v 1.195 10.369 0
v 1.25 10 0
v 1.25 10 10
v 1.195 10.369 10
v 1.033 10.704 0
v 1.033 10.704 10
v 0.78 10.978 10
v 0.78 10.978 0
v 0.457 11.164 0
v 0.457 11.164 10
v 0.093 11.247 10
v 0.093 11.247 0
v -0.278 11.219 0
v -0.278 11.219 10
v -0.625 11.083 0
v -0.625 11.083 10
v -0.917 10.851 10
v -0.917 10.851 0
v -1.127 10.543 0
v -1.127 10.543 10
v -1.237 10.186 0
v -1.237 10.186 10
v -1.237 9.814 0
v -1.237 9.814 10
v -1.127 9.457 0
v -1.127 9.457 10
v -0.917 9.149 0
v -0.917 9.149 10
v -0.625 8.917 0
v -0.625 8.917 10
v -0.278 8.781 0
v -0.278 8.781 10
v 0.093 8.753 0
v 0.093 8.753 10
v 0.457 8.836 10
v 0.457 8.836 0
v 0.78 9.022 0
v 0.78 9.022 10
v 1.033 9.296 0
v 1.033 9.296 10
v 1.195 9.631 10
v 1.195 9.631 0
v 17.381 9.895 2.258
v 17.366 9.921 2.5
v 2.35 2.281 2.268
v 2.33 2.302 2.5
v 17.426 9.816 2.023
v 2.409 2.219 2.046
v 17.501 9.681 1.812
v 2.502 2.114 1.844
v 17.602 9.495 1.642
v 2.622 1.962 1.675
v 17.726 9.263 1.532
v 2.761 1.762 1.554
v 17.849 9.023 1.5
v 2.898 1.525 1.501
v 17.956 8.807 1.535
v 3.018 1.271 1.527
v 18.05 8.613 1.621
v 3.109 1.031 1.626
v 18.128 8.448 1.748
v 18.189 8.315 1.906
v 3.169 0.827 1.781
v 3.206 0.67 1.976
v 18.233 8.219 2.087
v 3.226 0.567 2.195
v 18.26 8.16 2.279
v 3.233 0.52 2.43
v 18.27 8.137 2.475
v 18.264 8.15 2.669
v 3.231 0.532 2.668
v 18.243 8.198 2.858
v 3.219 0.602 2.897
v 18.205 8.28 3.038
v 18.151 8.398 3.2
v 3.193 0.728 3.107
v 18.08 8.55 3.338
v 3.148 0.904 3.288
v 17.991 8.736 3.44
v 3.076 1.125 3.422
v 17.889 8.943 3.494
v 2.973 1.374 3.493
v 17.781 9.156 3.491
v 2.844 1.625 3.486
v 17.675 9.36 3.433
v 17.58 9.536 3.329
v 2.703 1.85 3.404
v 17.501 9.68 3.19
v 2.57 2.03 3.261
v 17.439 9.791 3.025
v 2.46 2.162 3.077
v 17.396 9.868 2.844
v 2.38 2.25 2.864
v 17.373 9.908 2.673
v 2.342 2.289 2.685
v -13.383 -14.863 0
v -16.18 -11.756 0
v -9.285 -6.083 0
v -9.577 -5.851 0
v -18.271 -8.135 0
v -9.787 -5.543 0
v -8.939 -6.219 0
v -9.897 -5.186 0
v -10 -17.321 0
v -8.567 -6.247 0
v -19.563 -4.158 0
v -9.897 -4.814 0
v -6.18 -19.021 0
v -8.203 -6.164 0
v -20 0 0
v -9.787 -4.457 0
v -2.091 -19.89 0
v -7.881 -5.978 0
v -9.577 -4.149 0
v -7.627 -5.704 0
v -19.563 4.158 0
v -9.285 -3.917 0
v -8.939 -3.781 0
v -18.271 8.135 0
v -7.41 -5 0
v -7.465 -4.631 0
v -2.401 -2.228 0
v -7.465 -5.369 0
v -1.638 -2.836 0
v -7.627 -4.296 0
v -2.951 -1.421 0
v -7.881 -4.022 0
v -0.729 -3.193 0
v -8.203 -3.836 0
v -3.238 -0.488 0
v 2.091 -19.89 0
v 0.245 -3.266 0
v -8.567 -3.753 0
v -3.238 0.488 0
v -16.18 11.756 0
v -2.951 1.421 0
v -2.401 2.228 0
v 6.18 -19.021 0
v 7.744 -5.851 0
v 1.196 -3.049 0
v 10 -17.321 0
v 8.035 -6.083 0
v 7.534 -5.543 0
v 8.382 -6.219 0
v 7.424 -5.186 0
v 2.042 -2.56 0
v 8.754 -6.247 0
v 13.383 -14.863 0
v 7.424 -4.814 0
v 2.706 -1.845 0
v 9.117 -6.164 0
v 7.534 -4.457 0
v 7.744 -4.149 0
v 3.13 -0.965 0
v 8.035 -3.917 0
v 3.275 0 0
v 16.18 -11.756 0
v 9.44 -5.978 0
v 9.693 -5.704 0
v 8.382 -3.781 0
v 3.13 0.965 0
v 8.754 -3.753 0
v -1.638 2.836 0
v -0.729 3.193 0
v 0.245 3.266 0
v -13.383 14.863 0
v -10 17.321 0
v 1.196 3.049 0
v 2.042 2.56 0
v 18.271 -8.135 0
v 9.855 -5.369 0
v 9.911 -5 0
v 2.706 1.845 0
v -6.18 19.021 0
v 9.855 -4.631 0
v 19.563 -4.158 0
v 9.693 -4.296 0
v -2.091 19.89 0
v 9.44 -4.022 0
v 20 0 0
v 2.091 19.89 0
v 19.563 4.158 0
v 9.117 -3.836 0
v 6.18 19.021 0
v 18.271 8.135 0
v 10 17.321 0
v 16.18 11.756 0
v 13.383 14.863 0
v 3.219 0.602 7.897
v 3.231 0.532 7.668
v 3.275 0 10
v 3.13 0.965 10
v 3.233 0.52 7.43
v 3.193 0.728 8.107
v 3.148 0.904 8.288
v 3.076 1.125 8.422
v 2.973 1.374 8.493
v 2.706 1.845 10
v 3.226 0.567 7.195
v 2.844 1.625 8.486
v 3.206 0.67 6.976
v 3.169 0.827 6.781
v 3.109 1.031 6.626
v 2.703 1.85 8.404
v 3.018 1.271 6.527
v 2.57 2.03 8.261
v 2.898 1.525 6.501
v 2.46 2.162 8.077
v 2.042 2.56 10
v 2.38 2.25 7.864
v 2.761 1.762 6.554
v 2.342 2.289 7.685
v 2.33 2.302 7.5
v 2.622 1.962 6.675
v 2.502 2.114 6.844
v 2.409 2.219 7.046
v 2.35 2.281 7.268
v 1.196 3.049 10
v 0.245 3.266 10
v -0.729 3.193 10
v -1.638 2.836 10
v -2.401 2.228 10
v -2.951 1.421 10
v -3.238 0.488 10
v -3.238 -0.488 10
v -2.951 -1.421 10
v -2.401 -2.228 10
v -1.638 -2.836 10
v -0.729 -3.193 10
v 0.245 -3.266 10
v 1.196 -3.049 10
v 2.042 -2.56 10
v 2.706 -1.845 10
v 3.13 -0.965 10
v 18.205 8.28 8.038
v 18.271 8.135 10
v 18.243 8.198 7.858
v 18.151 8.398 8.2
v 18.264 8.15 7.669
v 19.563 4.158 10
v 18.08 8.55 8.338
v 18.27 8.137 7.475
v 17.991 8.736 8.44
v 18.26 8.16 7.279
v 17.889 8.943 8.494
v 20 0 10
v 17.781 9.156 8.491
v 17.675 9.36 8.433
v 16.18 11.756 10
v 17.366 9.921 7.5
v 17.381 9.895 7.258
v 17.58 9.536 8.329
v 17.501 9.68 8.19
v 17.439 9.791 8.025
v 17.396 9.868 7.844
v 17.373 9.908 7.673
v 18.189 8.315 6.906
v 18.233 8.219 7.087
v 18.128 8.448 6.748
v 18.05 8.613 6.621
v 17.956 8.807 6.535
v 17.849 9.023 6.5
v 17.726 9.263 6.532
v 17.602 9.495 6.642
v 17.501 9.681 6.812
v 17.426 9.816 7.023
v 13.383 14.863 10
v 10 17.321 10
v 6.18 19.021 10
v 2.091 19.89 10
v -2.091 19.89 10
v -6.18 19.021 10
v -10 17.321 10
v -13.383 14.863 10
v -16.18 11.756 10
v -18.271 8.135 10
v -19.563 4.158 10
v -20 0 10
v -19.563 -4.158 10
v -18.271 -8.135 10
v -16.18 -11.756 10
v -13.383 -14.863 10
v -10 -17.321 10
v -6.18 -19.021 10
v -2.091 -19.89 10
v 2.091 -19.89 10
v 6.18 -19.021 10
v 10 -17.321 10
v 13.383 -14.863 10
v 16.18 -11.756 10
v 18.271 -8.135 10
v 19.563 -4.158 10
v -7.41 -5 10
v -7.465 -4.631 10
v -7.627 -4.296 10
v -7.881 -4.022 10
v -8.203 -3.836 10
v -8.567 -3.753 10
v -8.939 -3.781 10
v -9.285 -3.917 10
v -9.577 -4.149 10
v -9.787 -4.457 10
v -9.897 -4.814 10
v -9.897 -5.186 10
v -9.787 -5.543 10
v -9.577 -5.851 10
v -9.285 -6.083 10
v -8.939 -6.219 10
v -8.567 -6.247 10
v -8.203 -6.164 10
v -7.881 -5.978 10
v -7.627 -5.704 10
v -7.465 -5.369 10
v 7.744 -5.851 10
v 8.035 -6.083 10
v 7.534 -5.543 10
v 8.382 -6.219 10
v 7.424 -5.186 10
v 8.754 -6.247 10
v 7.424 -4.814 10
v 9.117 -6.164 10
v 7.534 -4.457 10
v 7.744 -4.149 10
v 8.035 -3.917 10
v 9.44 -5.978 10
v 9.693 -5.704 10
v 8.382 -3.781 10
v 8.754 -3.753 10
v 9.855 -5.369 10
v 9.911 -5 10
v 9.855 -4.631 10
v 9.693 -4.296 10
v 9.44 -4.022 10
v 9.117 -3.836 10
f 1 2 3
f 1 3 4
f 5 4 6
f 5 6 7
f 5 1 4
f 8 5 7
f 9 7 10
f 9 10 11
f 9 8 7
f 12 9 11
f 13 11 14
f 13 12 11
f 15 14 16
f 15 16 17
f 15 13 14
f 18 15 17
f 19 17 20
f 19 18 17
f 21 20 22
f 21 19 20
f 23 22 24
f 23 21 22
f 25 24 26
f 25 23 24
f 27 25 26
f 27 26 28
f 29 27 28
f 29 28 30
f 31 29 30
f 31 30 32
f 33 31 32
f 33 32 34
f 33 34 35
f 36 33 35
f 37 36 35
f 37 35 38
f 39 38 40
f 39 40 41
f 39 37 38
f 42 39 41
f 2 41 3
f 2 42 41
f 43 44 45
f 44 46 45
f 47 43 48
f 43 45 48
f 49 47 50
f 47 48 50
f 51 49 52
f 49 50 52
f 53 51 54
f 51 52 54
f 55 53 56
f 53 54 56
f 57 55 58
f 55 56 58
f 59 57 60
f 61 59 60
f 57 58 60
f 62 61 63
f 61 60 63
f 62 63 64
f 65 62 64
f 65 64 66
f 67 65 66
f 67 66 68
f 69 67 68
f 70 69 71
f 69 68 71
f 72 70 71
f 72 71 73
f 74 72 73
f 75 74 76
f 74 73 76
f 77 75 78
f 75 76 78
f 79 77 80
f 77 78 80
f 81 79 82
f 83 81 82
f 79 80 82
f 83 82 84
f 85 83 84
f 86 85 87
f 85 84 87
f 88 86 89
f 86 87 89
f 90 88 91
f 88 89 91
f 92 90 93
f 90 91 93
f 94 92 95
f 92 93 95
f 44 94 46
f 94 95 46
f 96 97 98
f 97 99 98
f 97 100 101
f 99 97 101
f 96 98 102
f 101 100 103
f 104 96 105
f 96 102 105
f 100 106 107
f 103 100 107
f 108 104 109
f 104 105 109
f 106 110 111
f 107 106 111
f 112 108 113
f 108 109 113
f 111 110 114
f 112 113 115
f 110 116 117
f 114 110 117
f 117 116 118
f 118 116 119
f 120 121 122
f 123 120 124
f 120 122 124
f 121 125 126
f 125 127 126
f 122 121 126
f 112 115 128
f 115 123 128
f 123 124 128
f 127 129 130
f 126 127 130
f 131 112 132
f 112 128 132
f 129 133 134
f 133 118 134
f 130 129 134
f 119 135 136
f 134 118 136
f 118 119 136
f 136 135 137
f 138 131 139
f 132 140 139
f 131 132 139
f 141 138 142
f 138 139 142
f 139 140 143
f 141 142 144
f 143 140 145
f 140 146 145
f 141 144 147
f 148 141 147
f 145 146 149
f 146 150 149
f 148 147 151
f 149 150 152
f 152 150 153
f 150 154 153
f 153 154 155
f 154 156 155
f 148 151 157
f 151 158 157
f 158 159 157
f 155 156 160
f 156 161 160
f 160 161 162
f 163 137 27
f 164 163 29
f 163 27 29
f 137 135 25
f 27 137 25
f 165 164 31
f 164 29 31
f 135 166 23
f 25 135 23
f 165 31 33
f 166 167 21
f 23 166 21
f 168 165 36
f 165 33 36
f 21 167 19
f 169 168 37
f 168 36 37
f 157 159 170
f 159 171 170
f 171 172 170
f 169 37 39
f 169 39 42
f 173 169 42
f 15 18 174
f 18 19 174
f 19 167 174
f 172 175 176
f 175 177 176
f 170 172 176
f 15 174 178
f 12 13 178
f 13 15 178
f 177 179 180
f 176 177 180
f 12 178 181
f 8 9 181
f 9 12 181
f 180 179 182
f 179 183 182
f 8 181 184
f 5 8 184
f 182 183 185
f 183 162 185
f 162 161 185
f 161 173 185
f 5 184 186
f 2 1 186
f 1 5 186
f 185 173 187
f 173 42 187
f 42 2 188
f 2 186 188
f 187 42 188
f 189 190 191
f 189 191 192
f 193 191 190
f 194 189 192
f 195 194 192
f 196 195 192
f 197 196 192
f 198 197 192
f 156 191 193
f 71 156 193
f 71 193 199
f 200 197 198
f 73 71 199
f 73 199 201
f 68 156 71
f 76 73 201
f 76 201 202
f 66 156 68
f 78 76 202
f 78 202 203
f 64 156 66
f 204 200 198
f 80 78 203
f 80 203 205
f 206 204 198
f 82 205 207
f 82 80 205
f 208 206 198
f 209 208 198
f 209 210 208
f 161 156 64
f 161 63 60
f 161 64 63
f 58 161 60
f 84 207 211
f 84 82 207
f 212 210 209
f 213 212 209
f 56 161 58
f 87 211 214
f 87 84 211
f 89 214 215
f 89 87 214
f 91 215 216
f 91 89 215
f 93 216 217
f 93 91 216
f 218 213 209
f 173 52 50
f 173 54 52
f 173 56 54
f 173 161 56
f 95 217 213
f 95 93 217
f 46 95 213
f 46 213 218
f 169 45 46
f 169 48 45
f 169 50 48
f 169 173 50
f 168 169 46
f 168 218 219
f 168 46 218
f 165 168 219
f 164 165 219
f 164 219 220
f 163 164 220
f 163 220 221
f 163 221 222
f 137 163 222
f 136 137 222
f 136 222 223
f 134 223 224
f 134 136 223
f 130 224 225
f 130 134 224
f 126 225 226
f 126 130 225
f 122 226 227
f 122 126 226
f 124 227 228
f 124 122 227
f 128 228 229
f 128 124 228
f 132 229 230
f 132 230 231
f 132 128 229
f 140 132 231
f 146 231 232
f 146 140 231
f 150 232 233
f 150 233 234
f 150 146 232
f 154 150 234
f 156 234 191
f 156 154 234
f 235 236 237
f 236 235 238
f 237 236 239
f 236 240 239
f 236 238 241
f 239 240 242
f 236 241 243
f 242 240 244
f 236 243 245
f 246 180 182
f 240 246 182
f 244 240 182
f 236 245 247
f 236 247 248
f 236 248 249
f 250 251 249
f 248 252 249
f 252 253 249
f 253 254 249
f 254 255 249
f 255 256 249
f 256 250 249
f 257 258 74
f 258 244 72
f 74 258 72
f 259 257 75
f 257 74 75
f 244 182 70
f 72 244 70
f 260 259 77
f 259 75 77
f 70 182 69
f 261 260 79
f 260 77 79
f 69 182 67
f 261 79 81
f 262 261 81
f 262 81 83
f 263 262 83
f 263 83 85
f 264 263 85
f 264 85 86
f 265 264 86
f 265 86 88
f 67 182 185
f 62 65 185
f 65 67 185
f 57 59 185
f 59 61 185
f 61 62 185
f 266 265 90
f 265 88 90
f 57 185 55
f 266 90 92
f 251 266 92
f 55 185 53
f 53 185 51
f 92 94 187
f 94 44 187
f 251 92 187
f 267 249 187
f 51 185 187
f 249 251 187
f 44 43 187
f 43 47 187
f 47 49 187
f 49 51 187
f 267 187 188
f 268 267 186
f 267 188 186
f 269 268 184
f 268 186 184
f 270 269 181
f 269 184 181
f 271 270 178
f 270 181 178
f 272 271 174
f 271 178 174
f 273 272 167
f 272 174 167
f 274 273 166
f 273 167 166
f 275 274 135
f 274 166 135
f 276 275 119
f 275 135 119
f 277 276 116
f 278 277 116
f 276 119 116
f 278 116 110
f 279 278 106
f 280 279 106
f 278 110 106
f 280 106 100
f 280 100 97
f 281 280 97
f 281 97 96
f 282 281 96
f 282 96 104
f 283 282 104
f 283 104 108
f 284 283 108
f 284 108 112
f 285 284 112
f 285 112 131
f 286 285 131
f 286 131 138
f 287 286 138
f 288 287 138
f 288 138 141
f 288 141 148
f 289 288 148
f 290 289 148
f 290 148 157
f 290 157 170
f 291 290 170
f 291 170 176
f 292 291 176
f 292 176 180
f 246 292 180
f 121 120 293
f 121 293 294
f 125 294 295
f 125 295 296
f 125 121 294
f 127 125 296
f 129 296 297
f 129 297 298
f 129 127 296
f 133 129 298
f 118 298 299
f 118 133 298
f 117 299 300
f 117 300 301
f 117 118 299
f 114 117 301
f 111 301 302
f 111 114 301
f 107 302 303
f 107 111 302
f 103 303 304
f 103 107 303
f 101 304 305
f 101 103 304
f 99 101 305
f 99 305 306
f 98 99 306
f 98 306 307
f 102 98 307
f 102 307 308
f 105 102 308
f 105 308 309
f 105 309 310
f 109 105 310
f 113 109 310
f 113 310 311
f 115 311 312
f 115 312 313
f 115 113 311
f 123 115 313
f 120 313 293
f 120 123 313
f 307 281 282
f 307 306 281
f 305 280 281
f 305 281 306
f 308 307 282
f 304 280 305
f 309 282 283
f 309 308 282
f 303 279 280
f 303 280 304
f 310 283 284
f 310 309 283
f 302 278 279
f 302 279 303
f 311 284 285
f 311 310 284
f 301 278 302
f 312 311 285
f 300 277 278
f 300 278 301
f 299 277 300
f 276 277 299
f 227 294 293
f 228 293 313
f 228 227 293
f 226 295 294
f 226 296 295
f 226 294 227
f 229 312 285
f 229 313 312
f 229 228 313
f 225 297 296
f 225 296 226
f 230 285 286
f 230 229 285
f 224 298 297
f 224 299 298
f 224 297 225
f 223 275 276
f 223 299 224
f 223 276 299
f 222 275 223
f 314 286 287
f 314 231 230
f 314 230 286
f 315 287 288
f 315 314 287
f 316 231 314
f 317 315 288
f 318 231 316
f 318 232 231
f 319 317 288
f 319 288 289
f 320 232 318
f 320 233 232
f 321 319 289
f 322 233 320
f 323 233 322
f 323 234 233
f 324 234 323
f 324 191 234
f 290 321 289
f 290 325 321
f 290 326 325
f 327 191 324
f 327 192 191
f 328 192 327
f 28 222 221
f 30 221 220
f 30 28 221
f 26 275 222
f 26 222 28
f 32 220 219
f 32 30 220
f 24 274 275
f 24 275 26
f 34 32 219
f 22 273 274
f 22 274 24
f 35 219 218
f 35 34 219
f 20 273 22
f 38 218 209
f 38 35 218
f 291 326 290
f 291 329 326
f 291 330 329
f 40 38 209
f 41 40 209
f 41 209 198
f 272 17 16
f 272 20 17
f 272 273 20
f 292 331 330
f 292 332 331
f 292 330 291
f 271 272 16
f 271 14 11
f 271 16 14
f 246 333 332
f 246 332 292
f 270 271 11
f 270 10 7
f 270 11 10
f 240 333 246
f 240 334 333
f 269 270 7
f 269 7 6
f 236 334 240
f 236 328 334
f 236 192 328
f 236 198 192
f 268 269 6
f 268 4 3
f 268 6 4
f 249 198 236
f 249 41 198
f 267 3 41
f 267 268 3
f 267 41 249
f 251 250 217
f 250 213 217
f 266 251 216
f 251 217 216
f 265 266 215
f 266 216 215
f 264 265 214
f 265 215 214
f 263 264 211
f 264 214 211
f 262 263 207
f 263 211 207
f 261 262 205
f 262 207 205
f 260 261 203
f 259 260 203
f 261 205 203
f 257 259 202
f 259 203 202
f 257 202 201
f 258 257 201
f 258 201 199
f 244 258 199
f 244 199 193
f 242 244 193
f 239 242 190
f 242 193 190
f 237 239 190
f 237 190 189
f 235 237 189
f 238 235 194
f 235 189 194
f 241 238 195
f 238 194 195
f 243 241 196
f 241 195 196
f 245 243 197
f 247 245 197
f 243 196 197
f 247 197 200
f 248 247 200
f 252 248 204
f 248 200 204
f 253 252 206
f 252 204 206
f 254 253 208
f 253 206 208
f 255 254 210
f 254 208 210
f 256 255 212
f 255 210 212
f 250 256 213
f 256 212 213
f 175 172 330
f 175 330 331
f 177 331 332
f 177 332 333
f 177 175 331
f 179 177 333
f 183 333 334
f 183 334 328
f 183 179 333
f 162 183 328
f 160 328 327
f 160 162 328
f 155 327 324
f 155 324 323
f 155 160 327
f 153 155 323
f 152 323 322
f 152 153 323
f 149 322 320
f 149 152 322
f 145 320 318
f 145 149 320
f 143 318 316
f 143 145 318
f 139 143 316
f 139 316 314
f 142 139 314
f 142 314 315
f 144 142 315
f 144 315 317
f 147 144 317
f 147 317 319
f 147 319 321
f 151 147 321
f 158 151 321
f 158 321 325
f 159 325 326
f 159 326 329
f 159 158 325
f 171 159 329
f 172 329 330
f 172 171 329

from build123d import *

# Parameters (mm, degrees)
SKETCH1_R                           = 20
SKETCH1_R_2                         = 1.250479472
SKETCH1_R_3                         = 3.275
BOSS_EXTRUDE1_DEPTH                 = 10
CUT_EXTRUDE2_REACH                  = 41.275
CUT_EXTRUDE2_END_RADIUS             = 20
SKETCH4_R                           = 1
CUT_EXTRUDE2_DIRECTION_2_REACH      = 41.275
CUT_EXTRUDE2_DIRECTION_2_END_RADIUS = 3.275


with BuildPart() as part:
    # Sketch1 → Boss-Extrude1 (new body)
    with BuildSketch(Plane.XY):
        Circle(SKETCH1_R)
        with Locations((0, 10)):
            Circle(SKETCH1_R_2, mode=Mode.SUBTRACT)
        Circle(SKETCH1_R_3, mode=Mode.SUBTRACT)
        with Locations((8.660254038, -5)):
            Circle(SKETCH1_R_2, mode=Mode.SUBTRACT)
        with Locations((-8.660254038, -5)):
            Circle(SKETCH1_R_2, mode=Mode.SUBTRACT)
    extrude(amount=BOSS_EXTRUDE1_DEPTH)

    # Cut-Extrude2: up to this cylinder (the profile starts inside it)
    cut_extrude2_end = Plane(origin=(0, 0, 5), z_dir=(0, 0, -1)) * Cylinder(CUT_EXTRUDE2_END_RADIUS, 128.55, mode=Mode.PRIVATE)
    # Sketch4 → Cut-Extrude2 (cut, up to the surface)
    with BuildSketch(Plane(origin=(8.979891602, 4.550503837, 0), x_dir=(0.4520194972044375, -0.8920080572209242, 0), z_dir=(-0.8920080572209242, -0.4520194972044375, 0)), mode=Mode.PRIVATE) as cut_extrude2_sk1:
        with Locations(Location((0, 7.5, 0), (0, 0, 180))):
            Circle(SKETCH4_R)
    cut_extrude2_tool1 = extrude(cut_extrude2_sk1.sketch, amount=-CUT_EXTRUDE2_REACH, mode=Mode.PRIVATE) & cut_extrude2_end
    add(cut_extrude2_tool1.solids().sort_by_distance((8.979892, 4.550504, 7.5))[0], mode=Mode.SUBTRACT)
    # Sketch4 → Cut-Extrude2 (cut, up to the surface)
    with BuildSketch(Plane(origin=(8.979891602, 4.550503837, 0), x_dir=(0.4520194972044375, -0.8920080572209242, 0), z_dir=(-0.8920080572209242, -0.4520194972044375, 0)), mode=Mode.PRIVATE) as cut_extrude2_sk2:
        with Locations(Location((0, 2.5, 0), (0, 0, 180))):
            Circle(SKETCH4_R)
    cut_extrude2_tool2 = extrude(cut_extrude2_sk2.sketch, amount=-CUT_EXTRUDE2_REACH, mode=Mode.PRIVATE) & cut_extrude2_end
    add(cut_extrude2_tool2.solids().sort_by_distance((8.979892, 4.550504, 2.5))[0], mode=Mode.SUBTRACT)

    # Cut-Extrude2 direction 2: up to this cylinder (the profile starts outside it)
    cut_extrude2_direction_2_end = Plane(origin=(0, 0, 5), z_dir=(0, 0, -1)) * Cylinder(CUT_EXTRUDE2_DIRECTION_2_END_RADIUS, 95.1, mode=Mode.PRIVATE)
    # Sketch4 → Cut-Extrude2 direction 2 (cut, up to the surface)
    with BuildSketch(Plane(origin=(8.979891602, 4.550503837, 0), x_dir=(0.4520194972044375, -0.8920080572209242, 0), z_dir=(-0.8920080572209242, -0.4520194972044375, 0)), mode=Mode.PRIVATE) as cut_extrude2_direction_2_sk1:
        with Locations(Location((0, 7.5, 0), (0, 0, 180))):
            Circle(SKETCH4_R)
    cut_extrude2_direction_2_tool1 = extrude(cut_extrude2_direction_2_sk1.sketch, amount=CUT_EXTRUDE2_DIRECTION_2_REACH, mode=Mode.PRIVATE) - cut_extrude2_direction_2_end
    add(cut_extrude2_direction_2_tool1.solids().sort_by_distance((8.979892, 4.550504, 7.5))[0], mode=Mode.SUBTRACT)
    # Sketch4 → Cut-Extrude2 direction 2 (cut, up to the surface)
    with BuildSketch(Plane(origin=(8.979891602, 4.550503837, 0), x_dir=(0.4520194972044375, -0.8920080572209242, 0), z_dir=(-0.8920080572209242, -0.4520194972044375, 0)), mode=Mode.PRIVATE) as cut_extrude2_direction_2_sk2:
        with Locations(Location((0, 2.5, 0), (0, 0, 180))):
            Circle(SKETCH4_R)
    cut_extrude2_direction_2_tool2 = extrude(cut_extrude2_direction_2_sk2.sketch, amount=CUT_EXTRUDE2_DIRECTION_2_REACH, mode=Mode.PRIVATE) - cut_extrude2_direction_2_end
    add(cut_extrude2_direction_2_tool2.solids().sort_by_distance((8.979892, 4.550504, 2.5))[0], mode=Mode.SUBTRACT)


solid = part.part
